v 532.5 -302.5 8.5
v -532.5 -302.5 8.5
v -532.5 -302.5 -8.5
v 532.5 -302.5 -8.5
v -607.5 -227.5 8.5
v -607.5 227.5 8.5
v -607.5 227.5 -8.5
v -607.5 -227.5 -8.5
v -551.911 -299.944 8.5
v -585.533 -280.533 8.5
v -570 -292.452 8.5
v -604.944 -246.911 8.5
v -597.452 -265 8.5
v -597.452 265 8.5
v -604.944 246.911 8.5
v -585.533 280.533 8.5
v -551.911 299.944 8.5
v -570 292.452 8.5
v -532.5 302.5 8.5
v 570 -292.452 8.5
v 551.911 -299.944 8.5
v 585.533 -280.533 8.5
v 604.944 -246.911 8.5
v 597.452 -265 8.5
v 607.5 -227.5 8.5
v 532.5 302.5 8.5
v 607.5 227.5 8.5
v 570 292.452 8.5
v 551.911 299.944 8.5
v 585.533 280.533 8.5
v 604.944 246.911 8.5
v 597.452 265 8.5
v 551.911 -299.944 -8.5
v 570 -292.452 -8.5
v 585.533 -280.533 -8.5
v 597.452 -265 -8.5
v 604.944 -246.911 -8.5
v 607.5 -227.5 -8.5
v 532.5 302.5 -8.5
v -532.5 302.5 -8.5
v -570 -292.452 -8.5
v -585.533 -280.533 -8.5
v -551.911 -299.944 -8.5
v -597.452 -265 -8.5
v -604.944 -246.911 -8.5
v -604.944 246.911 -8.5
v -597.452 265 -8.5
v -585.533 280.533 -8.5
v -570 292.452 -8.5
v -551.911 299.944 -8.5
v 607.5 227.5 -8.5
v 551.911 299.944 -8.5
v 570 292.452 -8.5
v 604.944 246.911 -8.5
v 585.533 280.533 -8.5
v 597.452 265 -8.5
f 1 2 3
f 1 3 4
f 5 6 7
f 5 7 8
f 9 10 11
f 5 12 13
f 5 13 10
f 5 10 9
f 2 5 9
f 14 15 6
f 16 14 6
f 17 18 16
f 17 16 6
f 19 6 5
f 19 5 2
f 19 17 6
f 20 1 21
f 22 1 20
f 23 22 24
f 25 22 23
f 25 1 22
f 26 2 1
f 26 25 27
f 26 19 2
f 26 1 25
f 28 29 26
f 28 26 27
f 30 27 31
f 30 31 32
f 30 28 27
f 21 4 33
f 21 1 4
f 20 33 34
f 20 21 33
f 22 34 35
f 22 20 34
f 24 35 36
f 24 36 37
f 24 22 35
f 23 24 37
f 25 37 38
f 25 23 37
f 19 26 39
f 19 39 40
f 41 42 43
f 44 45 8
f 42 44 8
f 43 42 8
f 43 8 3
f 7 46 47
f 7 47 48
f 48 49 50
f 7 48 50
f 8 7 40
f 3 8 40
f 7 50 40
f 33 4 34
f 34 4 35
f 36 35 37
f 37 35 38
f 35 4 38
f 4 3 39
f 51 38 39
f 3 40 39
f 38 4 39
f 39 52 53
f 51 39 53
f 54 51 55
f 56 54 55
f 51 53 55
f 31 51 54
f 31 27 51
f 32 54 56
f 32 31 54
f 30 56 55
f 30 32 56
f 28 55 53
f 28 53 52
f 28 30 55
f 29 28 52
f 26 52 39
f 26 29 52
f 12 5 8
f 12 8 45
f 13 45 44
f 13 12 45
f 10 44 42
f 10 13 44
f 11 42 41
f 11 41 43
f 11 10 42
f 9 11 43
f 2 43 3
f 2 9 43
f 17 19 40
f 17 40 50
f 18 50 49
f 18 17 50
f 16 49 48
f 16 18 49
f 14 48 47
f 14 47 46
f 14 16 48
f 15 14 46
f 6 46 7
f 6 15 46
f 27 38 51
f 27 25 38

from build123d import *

# Parameters (mm, degrees)
F1_DEPTH = 8.5


with BuildPart() as f1:
    # F0 (on Top) → F1 (new body, symmetric)
    with BuildSketch(Plane.XY):
        with BuildLine():
            ThreePointArc((607.5, 227.5), (585.533009, 280.533009), (532.5, 302.5))
            Line((532.5, 302.5), (-532.5, 302.5))
            ThreePointArc((-532.5, 302.5), (-585.533009, 280.533009), (-607.5, 227.5))
            Line((-607.5, 227.5), (-607.5, -227.5))
            ThreePointArc((-607.5, -227.5), (-585.533009, -280.533009), (-532.5, -302.5))
            Line((-532.5, -302.5), (532.5, -302.5))
            ThreePointArc((532.5, -302.5), (585.533009, -280.533009), (607.5, -227.5))
            Line((607.5, -227.5), (607.5, 227.5))
        make_face()
    extrude(amount=F1_DEPTH, both=True)


solid = f1.part
